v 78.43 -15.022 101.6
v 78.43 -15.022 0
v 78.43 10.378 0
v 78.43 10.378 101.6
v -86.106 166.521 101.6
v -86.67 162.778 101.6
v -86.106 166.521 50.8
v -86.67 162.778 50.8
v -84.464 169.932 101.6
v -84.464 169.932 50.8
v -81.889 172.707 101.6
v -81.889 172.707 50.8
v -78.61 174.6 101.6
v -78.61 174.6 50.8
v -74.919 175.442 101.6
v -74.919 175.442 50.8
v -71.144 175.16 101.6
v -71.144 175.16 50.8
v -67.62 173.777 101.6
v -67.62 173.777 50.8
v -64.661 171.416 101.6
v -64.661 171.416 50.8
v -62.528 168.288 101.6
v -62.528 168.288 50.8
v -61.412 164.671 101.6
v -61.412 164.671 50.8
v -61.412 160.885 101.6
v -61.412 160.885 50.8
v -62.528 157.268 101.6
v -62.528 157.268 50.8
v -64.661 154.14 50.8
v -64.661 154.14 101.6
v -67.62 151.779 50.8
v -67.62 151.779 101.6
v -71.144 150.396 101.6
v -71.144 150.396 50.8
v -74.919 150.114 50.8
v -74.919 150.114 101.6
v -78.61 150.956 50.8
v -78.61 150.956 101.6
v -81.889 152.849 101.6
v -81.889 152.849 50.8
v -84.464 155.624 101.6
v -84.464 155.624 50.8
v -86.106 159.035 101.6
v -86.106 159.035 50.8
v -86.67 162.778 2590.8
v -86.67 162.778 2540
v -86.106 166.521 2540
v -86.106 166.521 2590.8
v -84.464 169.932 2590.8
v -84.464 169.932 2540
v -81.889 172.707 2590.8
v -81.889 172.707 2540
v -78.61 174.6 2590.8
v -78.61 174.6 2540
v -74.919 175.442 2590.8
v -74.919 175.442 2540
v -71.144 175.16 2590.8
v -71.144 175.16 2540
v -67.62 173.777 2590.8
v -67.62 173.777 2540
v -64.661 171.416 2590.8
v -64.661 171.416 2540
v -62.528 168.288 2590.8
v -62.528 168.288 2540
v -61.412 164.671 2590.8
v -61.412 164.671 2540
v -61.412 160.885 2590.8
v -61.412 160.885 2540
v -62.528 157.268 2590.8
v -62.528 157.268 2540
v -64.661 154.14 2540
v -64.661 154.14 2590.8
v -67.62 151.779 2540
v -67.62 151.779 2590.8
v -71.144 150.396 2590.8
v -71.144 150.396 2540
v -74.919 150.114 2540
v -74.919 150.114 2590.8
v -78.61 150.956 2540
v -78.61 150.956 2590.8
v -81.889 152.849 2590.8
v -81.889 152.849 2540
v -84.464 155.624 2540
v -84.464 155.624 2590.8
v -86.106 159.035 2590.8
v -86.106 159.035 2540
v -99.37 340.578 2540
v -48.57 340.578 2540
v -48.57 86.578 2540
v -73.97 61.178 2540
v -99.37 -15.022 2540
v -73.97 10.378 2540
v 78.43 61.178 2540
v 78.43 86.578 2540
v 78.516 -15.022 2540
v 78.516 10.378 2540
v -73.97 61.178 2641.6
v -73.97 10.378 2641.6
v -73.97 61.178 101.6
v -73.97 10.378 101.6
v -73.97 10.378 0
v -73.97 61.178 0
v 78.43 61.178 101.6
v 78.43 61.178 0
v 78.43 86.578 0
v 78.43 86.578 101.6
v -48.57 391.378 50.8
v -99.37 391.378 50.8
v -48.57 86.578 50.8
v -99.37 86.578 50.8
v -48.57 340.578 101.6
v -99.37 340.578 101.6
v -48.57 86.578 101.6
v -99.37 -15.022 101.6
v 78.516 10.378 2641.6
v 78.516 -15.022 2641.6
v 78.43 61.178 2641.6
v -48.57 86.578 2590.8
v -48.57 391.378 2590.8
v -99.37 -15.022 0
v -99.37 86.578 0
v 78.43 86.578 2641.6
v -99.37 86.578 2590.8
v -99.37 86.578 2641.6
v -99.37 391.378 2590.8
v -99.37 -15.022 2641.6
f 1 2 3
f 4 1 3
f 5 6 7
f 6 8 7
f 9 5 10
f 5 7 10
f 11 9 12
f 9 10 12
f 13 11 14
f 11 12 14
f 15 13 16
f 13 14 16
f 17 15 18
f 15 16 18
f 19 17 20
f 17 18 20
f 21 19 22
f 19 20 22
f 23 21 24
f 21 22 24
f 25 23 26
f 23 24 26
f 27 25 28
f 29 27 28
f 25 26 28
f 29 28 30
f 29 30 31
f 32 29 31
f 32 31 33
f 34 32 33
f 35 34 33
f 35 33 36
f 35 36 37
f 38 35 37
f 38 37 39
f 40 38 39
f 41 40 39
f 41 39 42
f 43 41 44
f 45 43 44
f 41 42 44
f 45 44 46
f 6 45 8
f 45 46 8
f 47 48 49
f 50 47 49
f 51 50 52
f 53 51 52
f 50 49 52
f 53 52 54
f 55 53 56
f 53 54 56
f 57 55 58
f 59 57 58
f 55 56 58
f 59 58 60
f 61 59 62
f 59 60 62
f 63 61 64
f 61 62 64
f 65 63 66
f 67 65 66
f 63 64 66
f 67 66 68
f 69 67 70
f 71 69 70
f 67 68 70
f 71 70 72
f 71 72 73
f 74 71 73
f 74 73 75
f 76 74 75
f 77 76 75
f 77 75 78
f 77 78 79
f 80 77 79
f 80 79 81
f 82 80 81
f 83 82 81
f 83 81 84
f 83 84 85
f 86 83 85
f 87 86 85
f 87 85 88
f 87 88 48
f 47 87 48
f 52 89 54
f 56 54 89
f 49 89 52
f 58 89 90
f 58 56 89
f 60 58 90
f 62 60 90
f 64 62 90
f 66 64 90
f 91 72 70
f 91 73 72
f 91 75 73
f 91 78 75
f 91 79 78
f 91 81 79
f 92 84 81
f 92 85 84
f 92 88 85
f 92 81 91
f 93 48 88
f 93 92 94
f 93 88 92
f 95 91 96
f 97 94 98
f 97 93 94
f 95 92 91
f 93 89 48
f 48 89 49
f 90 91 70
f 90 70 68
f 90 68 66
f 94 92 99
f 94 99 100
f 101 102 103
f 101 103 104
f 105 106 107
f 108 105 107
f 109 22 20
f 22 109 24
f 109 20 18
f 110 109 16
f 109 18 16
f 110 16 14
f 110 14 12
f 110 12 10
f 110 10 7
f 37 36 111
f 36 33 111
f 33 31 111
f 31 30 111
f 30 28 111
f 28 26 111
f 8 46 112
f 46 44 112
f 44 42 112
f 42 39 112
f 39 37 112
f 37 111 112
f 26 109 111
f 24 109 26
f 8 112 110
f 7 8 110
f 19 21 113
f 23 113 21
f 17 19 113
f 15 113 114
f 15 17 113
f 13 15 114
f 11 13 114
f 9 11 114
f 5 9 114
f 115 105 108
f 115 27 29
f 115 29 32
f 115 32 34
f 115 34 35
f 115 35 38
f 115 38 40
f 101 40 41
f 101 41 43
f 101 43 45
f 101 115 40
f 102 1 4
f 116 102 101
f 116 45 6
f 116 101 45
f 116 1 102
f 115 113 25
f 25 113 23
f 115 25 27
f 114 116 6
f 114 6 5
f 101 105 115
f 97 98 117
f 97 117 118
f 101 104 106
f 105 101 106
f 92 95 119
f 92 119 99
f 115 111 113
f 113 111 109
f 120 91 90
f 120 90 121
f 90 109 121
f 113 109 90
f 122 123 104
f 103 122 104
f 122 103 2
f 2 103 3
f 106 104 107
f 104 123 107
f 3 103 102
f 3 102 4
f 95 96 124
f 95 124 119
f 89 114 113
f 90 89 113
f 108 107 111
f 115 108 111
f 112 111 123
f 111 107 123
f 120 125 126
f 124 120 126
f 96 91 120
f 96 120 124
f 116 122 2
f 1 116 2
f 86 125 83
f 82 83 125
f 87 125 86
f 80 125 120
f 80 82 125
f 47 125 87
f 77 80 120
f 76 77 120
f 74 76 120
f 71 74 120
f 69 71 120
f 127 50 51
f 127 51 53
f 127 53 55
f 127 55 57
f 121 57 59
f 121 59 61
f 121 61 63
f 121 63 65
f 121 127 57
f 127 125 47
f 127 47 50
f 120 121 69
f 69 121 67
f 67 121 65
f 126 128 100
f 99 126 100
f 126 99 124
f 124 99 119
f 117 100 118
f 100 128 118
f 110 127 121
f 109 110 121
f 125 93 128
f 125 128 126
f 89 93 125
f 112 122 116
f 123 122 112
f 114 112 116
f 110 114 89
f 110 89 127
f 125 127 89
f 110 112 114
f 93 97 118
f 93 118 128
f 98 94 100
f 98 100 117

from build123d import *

# Parameters (mm, degrees)
F0_W      = 25.4
F0_H      = 50.8
F0_H_2    = 25.4
F0_W_2    = 152.4
F1_DEPTH  = 101.6
F2_W      = 50.8
F2_H      = 50.8
F3_DEPTH  = 304.8
F4_W      = 50.8
F4_H      = 50.8
F5_DEPTH  = 2489.2
F6_W      = 50.8
F6_H      = 50.8
F7_DEPTH  = 254
F8_W      = 152.4867629528
F8_H      = 25.4
F9_DEPTH  = 101.6
F11_D     = 25.4
F11_DEPTH = 2540
F11_TIP   = 7.6309298617


with BuildPart() as f1:
    # F0 (on Top) → F1 (new body)
    with BuildSketch(Plane.XY):
        with Locations((-86.6702721953, 35.7780026045)):
            Rectangle(F0_W, F0_H)
        with Locations((-86.6702721953, -2.3219973955)):
            Rectangle(F0_W, F0_H_2)
        with Locations((2.2297278047, -2.3219973955)):
            Rectangle(F0_W_2, F0_H_2)
        with Locations((-86.6702721953, 73.8780026045)):
            Rectangle(F0_W, F0_H_2)
        with Locations((2.2297278047, 73.8780026045)):
            Rectangle(F0_W_2, F0_H_2)
    extrude(amount=F1_DEPTH)

    # F2 (on face) → F3 (join)
    with BuildSketch(Plane(origin=(0, 86.5780026045, 0), x_dir=(-1, 0, 0), z_dir=(0, 1, 0))):
        with Locations((73.9702721953, 76.2)):
            Rectangle(F2_W, F2_H)
    extrude(amount=F3_DEPTH)

    # F4 (on face) → F5 (join)
    with BuildSketch(Plane.XY.offset(101.6)):
        with Locations((-73.9702721953, 365.9780026045)):
            Rectangle(F4_W, F4_H)
    extrude(amount=F5_DEPTH)

    # F6 (on face) → F7 (join)
    with BuildSketch(Plane.XZ.offset(-340.5780026045)):
        with Locations((-73.9702721953, 2565.4)):
            Rectangle(F6_W, F6_H)
    extrude(amount=F7_DEPTH)

    # F8 (on face) → F9 (join)
    with BuildSketch(Plane(origin=(0, 0, 2540), x_dir=(1, 0, 0), z_dir=(0, 0, -1))):
        Polygon((-99.3702721953, -61.1780026045), (-99.3702721953, -86.5780026045), (78.4297278047, -86.5780026045), (78.4297278047, -61.1780026045), (-73.9702721953, -61.1780026045), align=None)
        Polygon((-99.3702721953, 15.0219973955), (-99.3702721953, -61.1780026045), (-73.9702721953, -61.1780026045), (-73.9702721953, -10.3780026045), (-73.9702721953, 15.0219973955), align=None)
        with Locations((2.2731092811, 2.3219973955)):
            Rectangle(F8_W, F8_H)
    extrude(amount=-F9_DEPTH)

    # F11
    with Locations(Plane.XY.offset(2590.8)):
        with Locations((-73.9702721953, 162.7780026045)):
            Hole(F11_D / 2, depth=F11_DEPTH)
            with Locations((0, 0, -(F11_DEPTH + F11_TIP / 2))):  # 118° drill point
                Cone(0, F11_D / 2, F11_TIP, mode=Mode.SUBTRACT)


solid = f1.part
